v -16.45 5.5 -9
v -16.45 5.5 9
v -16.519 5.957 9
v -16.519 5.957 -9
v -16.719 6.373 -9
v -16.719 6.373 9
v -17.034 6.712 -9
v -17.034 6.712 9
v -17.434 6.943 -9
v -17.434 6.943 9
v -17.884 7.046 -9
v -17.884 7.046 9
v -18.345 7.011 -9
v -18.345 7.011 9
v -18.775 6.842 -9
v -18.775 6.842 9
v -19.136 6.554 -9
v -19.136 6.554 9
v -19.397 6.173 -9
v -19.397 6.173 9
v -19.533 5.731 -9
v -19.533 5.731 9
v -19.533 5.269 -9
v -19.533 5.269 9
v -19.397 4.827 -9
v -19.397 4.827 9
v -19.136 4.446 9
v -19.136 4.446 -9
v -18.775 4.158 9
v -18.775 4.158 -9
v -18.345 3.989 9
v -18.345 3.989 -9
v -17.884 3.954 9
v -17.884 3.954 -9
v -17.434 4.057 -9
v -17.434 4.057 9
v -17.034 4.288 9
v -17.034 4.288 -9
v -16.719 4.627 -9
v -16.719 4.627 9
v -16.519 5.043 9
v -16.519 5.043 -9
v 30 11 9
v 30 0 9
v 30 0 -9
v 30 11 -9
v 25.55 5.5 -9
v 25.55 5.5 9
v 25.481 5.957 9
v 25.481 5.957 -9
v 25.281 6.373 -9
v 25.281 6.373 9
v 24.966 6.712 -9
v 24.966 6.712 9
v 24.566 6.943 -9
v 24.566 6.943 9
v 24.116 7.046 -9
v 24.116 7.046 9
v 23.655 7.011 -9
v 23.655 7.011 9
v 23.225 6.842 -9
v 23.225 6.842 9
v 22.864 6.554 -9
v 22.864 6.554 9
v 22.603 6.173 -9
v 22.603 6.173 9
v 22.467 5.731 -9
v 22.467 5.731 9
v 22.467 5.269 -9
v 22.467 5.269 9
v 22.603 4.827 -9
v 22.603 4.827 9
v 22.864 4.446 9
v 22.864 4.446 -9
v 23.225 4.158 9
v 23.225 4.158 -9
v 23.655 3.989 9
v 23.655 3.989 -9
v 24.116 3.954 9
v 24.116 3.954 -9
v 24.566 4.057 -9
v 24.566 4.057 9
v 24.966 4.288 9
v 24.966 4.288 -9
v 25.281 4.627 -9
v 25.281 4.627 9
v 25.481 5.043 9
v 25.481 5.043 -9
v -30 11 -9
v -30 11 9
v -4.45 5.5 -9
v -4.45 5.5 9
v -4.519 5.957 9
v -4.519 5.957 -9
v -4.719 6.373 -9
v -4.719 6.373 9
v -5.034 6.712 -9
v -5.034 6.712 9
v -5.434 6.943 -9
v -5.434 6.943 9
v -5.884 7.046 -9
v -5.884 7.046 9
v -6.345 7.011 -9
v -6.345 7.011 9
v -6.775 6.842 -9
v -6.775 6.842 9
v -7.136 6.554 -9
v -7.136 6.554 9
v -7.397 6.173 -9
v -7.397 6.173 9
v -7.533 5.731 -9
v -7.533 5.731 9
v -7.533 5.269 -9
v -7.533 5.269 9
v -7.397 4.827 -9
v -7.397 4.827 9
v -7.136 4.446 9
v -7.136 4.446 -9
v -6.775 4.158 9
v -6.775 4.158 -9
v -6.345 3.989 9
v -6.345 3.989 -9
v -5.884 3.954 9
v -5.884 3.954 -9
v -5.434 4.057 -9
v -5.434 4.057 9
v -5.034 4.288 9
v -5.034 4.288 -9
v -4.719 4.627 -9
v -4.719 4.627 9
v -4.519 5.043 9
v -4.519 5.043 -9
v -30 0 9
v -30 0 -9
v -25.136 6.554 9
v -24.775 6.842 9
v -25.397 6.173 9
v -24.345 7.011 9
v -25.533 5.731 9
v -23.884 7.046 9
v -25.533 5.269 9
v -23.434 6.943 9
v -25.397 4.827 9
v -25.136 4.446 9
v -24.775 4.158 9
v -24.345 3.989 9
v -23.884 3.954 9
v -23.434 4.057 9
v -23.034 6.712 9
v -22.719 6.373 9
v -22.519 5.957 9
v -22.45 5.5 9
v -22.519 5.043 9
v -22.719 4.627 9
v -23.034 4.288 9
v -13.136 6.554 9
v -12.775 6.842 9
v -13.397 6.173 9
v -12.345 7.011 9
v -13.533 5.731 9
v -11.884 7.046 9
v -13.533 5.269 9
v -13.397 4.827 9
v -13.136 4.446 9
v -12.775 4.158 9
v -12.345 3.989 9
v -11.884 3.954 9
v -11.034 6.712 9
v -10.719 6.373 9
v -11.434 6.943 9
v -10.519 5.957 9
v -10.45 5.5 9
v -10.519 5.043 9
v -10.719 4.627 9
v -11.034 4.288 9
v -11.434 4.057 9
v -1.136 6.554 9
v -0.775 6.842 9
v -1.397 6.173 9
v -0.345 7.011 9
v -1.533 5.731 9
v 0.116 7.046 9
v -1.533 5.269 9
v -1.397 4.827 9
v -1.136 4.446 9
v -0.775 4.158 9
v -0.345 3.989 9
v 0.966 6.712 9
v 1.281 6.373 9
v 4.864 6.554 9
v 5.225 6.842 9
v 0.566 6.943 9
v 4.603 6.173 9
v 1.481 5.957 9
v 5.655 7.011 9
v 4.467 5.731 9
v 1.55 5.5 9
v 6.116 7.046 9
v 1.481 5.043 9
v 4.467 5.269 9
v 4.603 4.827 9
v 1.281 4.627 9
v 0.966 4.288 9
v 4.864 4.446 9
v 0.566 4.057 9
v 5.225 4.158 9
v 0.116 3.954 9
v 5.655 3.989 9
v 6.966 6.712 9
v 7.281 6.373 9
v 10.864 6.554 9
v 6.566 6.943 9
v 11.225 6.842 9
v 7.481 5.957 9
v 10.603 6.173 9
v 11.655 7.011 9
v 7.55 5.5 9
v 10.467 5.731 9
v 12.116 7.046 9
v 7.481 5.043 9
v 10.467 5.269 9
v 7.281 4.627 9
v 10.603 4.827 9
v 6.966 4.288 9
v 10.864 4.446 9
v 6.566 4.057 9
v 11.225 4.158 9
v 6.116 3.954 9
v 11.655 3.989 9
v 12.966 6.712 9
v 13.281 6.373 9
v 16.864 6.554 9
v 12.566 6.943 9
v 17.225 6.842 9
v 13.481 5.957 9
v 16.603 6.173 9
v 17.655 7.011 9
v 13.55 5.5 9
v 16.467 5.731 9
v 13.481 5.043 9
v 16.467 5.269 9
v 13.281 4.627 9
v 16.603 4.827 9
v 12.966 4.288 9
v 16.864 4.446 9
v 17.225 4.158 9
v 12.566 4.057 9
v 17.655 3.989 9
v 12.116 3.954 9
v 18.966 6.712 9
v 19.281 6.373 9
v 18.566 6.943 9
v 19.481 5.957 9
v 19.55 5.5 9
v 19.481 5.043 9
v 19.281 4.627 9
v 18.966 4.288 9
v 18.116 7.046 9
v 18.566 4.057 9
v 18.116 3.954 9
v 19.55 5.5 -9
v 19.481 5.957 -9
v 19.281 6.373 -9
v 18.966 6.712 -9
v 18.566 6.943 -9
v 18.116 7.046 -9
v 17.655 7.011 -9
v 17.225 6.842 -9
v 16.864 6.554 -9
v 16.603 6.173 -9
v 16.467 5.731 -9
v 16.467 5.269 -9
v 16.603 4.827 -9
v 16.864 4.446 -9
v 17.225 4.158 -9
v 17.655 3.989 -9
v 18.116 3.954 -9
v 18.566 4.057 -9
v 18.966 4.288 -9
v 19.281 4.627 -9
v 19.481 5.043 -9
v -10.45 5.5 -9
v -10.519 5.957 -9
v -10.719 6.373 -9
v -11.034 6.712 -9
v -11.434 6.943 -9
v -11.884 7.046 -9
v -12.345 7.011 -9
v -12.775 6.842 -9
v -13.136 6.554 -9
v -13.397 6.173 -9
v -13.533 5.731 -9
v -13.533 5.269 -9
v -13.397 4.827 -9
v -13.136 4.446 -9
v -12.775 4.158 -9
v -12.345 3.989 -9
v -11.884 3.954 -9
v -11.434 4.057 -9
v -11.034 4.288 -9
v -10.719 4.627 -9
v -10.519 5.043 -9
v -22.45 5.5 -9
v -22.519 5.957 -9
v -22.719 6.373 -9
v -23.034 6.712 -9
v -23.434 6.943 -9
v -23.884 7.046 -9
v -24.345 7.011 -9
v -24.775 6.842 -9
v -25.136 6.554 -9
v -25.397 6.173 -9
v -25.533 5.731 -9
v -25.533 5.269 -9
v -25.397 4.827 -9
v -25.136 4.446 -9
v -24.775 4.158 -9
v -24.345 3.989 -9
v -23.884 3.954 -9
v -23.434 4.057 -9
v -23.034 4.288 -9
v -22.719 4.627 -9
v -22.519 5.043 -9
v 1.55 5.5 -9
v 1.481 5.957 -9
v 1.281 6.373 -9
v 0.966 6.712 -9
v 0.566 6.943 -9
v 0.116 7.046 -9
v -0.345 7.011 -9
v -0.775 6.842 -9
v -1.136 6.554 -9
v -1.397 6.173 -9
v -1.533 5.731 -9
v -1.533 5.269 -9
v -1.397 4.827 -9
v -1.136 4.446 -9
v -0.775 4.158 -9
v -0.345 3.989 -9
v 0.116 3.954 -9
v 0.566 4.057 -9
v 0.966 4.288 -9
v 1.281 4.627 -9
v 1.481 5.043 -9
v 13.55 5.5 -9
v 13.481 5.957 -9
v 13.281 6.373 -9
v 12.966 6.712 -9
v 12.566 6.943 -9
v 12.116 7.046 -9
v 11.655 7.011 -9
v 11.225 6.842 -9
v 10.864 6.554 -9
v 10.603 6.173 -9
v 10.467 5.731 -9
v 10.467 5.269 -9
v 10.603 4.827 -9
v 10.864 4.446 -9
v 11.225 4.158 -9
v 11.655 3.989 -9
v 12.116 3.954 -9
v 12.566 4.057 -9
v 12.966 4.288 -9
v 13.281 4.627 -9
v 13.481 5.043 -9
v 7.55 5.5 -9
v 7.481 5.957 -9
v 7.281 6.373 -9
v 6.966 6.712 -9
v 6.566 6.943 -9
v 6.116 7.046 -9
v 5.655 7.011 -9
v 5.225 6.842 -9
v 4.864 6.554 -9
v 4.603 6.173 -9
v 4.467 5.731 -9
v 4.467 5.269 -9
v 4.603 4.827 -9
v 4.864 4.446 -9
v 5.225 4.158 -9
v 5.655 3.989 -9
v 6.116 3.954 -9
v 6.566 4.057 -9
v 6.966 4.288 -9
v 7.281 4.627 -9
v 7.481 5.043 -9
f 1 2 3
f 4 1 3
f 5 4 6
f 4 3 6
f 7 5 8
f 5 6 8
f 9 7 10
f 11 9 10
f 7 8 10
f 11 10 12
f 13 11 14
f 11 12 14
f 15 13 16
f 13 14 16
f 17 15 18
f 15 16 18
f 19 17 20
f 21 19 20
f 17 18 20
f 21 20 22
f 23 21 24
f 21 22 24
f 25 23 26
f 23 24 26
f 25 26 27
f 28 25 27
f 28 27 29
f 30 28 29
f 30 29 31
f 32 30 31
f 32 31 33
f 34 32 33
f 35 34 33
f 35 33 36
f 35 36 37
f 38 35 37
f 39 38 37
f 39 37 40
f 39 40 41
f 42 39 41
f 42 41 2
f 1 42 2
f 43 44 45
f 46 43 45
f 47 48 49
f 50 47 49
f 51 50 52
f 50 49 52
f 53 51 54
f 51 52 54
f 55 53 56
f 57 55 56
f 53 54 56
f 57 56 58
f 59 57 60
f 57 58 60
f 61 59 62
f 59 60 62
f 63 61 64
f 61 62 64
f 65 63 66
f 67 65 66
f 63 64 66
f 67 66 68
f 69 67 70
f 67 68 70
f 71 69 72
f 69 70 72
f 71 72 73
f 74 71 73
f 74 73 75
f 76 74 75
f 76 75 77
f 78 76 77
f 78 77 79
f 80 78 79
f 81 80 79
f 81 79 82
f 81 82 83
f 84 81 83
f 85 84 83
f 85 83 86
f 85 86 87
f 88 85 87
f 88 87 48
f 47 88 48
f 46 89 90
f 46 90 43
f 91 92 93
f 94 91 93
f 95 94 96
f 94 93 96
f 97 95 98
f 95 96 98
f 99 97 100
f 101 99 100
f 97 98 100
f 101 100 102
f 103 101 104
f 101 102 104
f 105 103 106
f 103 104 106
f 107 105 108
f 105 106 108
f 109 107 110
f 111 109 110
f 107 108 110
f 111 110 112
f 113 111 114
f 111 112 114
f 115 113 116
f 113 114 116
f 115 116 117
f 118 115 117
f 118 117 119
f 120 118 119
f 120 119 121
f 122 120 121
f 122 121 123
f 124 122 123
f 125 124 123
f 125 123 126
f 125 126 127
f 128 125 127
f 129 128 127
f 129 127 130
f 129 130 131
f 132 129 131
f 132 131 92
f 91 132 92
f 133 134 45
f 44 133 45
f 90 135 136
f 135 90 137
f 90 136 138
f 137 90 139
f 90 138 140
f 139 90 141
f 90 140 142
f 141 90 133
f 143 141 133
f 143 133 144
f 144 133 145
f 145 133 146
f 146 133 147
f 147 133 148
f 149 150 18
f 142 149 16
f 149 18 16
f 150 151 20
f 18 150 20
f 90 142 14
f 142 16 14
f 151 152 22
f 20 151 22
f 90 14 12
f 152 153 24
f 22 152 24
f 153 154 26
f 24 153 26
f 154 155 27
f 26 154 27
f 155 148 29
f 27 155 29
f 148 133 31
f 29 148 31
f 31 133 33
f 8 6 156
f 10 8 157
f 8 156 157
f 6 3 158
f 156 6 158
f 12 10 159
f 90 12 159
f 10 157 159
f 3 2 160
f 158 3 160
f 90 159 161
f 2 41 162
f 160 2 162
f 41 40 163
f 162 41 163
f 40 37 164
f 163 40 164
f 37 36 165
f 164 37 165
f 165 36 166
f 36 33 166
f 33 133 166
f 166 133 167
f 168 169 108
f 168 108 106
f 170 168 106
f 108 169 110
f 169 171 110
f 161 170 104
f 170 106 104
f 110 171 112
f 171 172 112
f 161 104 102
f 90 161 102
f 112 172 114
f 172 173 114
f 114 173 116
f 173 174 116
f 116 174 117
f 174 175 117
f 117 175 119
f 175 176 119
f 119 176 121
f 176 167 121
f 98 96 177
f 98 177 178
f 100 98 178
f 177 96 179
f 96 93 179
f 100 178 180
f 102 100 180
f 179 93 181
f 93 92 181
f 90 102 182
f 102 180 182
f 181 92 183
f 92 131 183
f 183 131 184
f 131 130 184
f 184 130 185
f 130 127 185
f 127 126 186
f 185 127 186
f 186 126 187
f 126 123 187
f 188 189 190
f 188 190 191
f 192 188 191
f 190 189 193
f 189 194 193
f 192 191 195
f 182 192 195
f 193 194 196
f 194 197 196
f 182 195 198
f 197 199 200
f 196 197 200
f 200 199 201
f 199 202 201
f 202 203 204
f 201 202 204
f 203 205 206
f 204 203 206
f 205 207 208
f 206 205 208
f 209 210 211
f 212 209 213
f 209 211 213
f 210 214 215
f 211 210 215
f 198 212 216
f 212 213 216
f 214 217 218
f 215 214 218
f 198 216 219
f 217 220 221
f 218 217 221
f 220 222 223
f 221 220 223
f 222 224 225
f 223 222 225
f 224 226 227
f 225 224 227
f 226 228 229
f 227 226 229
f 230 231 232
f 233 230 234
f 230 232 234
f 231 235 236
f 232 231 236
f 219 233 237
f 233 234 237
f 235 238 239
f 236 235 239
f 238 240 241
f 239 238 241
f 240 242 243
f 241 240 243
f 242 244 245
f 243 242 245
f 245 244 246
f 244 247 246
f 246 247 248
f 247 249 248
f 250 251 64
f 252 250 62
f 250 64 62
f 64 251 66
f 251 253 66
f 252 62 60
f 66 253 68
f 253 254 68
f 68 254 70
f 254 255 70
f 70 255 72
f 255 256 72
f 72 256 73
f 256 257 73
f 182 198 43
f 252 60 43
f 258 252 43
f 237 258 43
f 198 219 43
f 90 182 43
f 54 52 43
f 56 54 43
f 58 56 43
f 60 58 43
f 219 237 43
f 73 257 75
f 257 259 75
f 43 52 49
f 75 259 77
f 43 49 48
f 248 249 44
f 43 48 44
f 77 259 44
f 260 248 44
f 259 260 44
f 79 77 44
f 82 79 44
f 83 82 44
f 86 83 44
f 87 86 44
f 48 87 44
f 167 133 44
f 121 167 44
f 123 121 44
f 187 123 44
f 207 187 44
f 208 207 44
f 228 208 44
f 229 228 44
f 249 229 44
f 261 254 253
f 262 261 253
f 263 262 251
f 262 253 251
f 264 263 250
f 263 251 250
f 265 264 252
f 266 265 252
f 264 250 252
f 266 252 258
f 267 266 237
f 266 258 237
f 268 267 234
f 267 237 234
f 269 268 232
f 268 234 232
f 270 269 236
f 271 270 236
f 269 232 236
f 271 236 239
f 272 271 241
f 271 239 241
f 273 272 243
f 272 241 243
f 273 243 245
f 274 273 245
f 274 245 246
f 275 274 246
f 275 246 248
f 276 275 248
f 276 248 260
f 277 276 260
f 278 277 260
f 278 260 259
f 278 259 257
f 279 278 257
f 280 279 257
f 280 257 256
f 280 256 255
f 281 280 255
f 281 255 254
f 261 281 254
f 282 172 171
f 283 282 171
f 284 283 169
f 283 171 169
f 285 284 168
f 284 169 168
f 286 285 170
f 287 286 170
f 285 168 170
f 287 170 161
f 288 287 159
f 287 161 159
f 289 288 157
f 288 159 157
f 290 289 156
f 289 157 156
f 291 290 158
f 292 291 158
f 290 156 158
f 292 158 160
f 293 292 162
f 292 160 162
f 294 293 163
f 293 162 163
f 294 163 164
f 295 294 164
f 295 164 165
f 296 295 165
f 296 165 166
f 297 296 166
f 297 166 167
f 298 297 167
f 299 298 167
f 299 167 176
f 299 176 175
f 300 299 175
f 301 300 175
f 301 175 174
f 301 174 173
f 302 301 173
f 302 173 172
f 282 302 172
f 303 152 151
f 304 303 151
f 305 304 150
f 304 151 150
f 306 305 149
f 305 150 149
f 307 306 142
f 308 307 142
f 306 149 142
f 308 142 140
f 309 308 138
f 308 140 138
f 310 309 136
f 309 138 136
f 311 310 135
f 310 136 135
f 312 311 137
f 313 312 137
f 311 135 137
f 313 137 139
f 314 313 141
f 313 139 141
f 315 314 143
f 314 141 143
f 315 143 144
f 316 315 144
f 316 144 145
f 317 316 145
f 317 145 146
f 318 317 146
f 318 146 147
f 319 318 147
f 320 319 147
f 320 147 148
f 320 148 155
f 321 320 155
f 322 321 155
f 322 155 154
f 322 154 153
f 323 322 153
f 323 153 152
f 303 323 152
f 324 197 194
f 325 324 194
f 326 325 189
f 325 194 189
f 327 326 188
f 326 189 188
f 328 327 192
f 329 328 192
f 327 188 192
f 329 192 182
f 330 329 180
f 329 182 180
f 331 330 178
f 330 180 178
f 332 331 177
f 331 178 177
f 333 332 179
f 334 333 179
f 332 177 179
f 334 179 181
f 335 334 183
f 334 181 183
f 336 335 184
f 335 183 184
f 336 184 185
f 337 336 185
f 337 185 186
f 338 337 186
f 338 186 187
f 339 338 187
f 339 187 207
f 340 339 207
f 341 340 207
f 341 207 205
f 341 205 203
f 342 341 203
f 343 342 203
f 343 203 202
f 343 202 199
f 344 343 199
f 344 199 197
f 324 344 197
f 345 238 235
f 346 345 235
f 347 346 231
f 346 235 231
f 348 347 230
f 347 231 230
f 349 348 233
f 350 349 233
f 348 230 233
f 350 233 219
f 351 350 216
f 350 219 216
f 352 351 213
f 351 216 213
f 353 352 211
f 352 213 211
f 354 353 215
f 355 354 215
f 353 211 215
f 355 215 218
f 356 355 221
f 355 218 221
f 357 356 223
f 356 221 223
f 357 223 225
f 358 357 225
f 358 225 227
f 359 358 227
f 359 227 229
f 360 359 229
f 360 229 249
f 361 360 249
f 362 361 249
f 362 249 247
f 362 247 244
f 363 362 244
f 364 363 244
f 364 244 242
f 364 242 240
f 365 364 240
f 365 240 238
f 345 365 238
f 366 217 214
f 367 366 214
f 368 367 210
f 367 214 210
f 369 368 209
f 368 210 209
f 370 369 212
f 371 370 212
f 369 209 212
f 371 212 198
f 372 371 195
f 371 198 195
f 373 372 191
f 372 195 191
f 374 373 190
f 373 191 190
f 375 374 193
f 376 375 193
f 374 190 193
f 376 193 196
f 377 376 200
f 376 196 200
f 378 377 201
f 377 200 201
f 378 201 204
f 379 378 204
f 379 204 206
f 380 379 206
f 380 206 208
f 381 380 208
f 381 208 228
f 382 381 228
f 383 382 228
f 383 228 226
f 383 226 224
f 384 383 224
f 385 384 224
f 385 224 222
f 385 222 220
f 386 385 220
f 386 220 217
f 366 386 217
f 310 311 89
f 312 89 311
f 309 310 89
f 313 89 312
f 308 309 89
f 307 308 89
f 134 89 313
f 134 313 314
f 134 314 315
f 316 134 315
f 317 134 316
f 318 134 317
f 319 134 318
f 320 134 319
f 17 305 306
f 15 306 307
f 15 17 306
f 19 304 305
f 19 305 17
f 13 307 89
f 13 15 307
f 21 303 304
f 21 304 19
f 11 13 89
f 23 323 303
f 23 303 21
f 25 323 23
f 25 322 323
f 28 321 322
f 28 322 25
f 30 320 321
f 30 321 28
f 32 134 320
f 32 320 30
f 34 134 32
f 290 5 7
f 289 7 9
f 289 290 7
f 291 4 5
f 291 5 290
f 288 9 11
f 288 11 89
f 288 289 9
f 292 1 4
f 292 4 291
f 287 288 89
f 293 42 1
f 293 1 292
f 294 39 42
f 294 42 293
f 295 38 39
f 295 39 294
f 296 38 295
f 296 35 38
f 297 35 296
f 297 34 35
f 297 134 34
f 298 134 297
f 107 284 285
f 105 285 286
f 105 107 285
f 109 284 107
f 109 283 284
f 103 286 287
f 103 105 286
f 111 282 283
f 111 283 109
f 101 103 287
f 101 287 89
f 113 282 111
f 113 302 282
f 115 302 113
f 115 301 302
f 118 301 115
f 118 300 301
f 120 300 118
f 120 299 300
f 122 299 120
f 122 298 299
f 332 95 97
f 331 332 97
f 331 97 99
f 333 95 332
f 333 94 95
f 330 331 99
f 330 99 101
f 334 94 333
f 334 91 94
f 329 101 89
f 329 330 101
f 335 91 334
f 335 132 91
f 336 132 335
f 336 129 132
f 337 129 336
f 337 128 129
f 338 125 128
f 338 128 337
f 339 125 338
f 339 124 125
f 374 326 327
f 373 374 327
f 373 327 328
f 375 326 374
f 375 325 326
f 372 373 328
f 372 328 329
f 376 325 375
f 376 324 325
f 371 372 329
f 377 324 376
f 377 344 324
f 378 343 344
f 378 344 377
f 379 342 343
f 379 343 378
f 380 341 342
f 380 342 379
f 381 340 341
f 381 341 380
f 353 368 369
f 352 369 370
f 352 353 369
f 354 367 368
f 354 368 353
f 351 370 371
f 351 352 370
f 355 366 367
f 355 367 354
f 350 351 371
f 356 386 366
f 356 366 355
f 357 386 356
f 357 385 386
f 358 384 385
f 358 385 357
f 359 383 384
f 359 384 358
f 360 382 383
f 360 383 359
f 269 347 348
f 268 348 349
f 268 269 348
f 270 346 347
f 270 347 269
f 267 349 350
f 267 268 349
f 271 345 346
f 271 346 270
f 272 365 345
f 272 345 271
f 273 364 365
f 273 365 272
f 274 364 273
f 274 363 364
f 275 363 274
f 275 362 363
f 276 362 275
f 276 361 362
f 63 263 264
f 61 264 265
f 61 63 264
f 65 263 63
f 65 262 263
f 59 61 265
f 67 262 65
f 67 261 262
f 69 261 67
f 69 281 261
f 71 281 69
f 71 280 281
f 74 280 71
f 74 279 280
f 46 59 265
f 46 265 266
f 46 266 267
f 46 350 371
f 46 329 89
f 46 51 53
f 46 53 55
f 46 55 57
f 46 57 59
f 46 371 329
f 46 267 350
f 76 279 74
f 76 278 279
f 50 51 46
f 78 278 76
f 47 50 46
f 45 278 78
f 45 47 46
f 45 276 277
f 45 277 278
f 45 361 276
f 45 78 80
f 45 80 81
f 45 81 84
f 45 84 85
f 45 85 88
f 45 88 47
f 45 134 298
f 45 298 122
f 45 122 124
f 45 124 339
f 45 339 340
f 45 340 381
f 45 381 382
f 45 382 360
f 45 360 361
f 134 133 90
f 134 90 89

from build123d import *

# Parameters (mm, degrees)
SKETCH_1_W          = 60
SKETCH_1_H          = 18
EXTRUDE_1_DEPTH     = 11
SKETCH_2_R          = 1.55
CUT_EXTRUDE_2_DEPTH = 37.674241642


with BuildPart() as part:
    # 草图1 → 凸台-拉伸1 (new body)
    with BuildSketch(Plane(origin=(0, 0, 0), x_dir=(1, 0, 0), z_dir=(0, 1, 0))):
        Rectangle(SKETCH_1_W, SKETCH_1_H)
    extrude(amount=EXTRUDE_1_DEPTH)

    # 草图2 → 切除-拉伸2 (cut, through all)
    with BuildSketch(Plane.XY.offset(9)):
        with Locations((-24, 5.5)):
            Circle(SKETCH_2_R)
        with Locations((-18, 5.5)):
            Circle(SKETCH_2_R)
        with Locations((-12, 5.5)):
            Circle(SKETCH_2_R)
        with Locations((-6, 5.5)):
            Circle(SKETCH_2_R)
        with Locations((0, 5.5)):
            Circle(SKETCH_2_R)
        with Locations((6, 5.5)):
            Circle(SKETCH_2_R)
        with Locations((12, 5.5)):
            Circle(SKETCH_2_R)
        with Locations((18, 5.5)):
            Circle(SKETCH_2_R)
        with Locations((24, 5.5)):
            Circle(SKETCH_2_R)
    extrude(amount=-CUT_EXTRUDE_2_DEPTH, mode=Mode.SUBTRACT)


solid = part.part
